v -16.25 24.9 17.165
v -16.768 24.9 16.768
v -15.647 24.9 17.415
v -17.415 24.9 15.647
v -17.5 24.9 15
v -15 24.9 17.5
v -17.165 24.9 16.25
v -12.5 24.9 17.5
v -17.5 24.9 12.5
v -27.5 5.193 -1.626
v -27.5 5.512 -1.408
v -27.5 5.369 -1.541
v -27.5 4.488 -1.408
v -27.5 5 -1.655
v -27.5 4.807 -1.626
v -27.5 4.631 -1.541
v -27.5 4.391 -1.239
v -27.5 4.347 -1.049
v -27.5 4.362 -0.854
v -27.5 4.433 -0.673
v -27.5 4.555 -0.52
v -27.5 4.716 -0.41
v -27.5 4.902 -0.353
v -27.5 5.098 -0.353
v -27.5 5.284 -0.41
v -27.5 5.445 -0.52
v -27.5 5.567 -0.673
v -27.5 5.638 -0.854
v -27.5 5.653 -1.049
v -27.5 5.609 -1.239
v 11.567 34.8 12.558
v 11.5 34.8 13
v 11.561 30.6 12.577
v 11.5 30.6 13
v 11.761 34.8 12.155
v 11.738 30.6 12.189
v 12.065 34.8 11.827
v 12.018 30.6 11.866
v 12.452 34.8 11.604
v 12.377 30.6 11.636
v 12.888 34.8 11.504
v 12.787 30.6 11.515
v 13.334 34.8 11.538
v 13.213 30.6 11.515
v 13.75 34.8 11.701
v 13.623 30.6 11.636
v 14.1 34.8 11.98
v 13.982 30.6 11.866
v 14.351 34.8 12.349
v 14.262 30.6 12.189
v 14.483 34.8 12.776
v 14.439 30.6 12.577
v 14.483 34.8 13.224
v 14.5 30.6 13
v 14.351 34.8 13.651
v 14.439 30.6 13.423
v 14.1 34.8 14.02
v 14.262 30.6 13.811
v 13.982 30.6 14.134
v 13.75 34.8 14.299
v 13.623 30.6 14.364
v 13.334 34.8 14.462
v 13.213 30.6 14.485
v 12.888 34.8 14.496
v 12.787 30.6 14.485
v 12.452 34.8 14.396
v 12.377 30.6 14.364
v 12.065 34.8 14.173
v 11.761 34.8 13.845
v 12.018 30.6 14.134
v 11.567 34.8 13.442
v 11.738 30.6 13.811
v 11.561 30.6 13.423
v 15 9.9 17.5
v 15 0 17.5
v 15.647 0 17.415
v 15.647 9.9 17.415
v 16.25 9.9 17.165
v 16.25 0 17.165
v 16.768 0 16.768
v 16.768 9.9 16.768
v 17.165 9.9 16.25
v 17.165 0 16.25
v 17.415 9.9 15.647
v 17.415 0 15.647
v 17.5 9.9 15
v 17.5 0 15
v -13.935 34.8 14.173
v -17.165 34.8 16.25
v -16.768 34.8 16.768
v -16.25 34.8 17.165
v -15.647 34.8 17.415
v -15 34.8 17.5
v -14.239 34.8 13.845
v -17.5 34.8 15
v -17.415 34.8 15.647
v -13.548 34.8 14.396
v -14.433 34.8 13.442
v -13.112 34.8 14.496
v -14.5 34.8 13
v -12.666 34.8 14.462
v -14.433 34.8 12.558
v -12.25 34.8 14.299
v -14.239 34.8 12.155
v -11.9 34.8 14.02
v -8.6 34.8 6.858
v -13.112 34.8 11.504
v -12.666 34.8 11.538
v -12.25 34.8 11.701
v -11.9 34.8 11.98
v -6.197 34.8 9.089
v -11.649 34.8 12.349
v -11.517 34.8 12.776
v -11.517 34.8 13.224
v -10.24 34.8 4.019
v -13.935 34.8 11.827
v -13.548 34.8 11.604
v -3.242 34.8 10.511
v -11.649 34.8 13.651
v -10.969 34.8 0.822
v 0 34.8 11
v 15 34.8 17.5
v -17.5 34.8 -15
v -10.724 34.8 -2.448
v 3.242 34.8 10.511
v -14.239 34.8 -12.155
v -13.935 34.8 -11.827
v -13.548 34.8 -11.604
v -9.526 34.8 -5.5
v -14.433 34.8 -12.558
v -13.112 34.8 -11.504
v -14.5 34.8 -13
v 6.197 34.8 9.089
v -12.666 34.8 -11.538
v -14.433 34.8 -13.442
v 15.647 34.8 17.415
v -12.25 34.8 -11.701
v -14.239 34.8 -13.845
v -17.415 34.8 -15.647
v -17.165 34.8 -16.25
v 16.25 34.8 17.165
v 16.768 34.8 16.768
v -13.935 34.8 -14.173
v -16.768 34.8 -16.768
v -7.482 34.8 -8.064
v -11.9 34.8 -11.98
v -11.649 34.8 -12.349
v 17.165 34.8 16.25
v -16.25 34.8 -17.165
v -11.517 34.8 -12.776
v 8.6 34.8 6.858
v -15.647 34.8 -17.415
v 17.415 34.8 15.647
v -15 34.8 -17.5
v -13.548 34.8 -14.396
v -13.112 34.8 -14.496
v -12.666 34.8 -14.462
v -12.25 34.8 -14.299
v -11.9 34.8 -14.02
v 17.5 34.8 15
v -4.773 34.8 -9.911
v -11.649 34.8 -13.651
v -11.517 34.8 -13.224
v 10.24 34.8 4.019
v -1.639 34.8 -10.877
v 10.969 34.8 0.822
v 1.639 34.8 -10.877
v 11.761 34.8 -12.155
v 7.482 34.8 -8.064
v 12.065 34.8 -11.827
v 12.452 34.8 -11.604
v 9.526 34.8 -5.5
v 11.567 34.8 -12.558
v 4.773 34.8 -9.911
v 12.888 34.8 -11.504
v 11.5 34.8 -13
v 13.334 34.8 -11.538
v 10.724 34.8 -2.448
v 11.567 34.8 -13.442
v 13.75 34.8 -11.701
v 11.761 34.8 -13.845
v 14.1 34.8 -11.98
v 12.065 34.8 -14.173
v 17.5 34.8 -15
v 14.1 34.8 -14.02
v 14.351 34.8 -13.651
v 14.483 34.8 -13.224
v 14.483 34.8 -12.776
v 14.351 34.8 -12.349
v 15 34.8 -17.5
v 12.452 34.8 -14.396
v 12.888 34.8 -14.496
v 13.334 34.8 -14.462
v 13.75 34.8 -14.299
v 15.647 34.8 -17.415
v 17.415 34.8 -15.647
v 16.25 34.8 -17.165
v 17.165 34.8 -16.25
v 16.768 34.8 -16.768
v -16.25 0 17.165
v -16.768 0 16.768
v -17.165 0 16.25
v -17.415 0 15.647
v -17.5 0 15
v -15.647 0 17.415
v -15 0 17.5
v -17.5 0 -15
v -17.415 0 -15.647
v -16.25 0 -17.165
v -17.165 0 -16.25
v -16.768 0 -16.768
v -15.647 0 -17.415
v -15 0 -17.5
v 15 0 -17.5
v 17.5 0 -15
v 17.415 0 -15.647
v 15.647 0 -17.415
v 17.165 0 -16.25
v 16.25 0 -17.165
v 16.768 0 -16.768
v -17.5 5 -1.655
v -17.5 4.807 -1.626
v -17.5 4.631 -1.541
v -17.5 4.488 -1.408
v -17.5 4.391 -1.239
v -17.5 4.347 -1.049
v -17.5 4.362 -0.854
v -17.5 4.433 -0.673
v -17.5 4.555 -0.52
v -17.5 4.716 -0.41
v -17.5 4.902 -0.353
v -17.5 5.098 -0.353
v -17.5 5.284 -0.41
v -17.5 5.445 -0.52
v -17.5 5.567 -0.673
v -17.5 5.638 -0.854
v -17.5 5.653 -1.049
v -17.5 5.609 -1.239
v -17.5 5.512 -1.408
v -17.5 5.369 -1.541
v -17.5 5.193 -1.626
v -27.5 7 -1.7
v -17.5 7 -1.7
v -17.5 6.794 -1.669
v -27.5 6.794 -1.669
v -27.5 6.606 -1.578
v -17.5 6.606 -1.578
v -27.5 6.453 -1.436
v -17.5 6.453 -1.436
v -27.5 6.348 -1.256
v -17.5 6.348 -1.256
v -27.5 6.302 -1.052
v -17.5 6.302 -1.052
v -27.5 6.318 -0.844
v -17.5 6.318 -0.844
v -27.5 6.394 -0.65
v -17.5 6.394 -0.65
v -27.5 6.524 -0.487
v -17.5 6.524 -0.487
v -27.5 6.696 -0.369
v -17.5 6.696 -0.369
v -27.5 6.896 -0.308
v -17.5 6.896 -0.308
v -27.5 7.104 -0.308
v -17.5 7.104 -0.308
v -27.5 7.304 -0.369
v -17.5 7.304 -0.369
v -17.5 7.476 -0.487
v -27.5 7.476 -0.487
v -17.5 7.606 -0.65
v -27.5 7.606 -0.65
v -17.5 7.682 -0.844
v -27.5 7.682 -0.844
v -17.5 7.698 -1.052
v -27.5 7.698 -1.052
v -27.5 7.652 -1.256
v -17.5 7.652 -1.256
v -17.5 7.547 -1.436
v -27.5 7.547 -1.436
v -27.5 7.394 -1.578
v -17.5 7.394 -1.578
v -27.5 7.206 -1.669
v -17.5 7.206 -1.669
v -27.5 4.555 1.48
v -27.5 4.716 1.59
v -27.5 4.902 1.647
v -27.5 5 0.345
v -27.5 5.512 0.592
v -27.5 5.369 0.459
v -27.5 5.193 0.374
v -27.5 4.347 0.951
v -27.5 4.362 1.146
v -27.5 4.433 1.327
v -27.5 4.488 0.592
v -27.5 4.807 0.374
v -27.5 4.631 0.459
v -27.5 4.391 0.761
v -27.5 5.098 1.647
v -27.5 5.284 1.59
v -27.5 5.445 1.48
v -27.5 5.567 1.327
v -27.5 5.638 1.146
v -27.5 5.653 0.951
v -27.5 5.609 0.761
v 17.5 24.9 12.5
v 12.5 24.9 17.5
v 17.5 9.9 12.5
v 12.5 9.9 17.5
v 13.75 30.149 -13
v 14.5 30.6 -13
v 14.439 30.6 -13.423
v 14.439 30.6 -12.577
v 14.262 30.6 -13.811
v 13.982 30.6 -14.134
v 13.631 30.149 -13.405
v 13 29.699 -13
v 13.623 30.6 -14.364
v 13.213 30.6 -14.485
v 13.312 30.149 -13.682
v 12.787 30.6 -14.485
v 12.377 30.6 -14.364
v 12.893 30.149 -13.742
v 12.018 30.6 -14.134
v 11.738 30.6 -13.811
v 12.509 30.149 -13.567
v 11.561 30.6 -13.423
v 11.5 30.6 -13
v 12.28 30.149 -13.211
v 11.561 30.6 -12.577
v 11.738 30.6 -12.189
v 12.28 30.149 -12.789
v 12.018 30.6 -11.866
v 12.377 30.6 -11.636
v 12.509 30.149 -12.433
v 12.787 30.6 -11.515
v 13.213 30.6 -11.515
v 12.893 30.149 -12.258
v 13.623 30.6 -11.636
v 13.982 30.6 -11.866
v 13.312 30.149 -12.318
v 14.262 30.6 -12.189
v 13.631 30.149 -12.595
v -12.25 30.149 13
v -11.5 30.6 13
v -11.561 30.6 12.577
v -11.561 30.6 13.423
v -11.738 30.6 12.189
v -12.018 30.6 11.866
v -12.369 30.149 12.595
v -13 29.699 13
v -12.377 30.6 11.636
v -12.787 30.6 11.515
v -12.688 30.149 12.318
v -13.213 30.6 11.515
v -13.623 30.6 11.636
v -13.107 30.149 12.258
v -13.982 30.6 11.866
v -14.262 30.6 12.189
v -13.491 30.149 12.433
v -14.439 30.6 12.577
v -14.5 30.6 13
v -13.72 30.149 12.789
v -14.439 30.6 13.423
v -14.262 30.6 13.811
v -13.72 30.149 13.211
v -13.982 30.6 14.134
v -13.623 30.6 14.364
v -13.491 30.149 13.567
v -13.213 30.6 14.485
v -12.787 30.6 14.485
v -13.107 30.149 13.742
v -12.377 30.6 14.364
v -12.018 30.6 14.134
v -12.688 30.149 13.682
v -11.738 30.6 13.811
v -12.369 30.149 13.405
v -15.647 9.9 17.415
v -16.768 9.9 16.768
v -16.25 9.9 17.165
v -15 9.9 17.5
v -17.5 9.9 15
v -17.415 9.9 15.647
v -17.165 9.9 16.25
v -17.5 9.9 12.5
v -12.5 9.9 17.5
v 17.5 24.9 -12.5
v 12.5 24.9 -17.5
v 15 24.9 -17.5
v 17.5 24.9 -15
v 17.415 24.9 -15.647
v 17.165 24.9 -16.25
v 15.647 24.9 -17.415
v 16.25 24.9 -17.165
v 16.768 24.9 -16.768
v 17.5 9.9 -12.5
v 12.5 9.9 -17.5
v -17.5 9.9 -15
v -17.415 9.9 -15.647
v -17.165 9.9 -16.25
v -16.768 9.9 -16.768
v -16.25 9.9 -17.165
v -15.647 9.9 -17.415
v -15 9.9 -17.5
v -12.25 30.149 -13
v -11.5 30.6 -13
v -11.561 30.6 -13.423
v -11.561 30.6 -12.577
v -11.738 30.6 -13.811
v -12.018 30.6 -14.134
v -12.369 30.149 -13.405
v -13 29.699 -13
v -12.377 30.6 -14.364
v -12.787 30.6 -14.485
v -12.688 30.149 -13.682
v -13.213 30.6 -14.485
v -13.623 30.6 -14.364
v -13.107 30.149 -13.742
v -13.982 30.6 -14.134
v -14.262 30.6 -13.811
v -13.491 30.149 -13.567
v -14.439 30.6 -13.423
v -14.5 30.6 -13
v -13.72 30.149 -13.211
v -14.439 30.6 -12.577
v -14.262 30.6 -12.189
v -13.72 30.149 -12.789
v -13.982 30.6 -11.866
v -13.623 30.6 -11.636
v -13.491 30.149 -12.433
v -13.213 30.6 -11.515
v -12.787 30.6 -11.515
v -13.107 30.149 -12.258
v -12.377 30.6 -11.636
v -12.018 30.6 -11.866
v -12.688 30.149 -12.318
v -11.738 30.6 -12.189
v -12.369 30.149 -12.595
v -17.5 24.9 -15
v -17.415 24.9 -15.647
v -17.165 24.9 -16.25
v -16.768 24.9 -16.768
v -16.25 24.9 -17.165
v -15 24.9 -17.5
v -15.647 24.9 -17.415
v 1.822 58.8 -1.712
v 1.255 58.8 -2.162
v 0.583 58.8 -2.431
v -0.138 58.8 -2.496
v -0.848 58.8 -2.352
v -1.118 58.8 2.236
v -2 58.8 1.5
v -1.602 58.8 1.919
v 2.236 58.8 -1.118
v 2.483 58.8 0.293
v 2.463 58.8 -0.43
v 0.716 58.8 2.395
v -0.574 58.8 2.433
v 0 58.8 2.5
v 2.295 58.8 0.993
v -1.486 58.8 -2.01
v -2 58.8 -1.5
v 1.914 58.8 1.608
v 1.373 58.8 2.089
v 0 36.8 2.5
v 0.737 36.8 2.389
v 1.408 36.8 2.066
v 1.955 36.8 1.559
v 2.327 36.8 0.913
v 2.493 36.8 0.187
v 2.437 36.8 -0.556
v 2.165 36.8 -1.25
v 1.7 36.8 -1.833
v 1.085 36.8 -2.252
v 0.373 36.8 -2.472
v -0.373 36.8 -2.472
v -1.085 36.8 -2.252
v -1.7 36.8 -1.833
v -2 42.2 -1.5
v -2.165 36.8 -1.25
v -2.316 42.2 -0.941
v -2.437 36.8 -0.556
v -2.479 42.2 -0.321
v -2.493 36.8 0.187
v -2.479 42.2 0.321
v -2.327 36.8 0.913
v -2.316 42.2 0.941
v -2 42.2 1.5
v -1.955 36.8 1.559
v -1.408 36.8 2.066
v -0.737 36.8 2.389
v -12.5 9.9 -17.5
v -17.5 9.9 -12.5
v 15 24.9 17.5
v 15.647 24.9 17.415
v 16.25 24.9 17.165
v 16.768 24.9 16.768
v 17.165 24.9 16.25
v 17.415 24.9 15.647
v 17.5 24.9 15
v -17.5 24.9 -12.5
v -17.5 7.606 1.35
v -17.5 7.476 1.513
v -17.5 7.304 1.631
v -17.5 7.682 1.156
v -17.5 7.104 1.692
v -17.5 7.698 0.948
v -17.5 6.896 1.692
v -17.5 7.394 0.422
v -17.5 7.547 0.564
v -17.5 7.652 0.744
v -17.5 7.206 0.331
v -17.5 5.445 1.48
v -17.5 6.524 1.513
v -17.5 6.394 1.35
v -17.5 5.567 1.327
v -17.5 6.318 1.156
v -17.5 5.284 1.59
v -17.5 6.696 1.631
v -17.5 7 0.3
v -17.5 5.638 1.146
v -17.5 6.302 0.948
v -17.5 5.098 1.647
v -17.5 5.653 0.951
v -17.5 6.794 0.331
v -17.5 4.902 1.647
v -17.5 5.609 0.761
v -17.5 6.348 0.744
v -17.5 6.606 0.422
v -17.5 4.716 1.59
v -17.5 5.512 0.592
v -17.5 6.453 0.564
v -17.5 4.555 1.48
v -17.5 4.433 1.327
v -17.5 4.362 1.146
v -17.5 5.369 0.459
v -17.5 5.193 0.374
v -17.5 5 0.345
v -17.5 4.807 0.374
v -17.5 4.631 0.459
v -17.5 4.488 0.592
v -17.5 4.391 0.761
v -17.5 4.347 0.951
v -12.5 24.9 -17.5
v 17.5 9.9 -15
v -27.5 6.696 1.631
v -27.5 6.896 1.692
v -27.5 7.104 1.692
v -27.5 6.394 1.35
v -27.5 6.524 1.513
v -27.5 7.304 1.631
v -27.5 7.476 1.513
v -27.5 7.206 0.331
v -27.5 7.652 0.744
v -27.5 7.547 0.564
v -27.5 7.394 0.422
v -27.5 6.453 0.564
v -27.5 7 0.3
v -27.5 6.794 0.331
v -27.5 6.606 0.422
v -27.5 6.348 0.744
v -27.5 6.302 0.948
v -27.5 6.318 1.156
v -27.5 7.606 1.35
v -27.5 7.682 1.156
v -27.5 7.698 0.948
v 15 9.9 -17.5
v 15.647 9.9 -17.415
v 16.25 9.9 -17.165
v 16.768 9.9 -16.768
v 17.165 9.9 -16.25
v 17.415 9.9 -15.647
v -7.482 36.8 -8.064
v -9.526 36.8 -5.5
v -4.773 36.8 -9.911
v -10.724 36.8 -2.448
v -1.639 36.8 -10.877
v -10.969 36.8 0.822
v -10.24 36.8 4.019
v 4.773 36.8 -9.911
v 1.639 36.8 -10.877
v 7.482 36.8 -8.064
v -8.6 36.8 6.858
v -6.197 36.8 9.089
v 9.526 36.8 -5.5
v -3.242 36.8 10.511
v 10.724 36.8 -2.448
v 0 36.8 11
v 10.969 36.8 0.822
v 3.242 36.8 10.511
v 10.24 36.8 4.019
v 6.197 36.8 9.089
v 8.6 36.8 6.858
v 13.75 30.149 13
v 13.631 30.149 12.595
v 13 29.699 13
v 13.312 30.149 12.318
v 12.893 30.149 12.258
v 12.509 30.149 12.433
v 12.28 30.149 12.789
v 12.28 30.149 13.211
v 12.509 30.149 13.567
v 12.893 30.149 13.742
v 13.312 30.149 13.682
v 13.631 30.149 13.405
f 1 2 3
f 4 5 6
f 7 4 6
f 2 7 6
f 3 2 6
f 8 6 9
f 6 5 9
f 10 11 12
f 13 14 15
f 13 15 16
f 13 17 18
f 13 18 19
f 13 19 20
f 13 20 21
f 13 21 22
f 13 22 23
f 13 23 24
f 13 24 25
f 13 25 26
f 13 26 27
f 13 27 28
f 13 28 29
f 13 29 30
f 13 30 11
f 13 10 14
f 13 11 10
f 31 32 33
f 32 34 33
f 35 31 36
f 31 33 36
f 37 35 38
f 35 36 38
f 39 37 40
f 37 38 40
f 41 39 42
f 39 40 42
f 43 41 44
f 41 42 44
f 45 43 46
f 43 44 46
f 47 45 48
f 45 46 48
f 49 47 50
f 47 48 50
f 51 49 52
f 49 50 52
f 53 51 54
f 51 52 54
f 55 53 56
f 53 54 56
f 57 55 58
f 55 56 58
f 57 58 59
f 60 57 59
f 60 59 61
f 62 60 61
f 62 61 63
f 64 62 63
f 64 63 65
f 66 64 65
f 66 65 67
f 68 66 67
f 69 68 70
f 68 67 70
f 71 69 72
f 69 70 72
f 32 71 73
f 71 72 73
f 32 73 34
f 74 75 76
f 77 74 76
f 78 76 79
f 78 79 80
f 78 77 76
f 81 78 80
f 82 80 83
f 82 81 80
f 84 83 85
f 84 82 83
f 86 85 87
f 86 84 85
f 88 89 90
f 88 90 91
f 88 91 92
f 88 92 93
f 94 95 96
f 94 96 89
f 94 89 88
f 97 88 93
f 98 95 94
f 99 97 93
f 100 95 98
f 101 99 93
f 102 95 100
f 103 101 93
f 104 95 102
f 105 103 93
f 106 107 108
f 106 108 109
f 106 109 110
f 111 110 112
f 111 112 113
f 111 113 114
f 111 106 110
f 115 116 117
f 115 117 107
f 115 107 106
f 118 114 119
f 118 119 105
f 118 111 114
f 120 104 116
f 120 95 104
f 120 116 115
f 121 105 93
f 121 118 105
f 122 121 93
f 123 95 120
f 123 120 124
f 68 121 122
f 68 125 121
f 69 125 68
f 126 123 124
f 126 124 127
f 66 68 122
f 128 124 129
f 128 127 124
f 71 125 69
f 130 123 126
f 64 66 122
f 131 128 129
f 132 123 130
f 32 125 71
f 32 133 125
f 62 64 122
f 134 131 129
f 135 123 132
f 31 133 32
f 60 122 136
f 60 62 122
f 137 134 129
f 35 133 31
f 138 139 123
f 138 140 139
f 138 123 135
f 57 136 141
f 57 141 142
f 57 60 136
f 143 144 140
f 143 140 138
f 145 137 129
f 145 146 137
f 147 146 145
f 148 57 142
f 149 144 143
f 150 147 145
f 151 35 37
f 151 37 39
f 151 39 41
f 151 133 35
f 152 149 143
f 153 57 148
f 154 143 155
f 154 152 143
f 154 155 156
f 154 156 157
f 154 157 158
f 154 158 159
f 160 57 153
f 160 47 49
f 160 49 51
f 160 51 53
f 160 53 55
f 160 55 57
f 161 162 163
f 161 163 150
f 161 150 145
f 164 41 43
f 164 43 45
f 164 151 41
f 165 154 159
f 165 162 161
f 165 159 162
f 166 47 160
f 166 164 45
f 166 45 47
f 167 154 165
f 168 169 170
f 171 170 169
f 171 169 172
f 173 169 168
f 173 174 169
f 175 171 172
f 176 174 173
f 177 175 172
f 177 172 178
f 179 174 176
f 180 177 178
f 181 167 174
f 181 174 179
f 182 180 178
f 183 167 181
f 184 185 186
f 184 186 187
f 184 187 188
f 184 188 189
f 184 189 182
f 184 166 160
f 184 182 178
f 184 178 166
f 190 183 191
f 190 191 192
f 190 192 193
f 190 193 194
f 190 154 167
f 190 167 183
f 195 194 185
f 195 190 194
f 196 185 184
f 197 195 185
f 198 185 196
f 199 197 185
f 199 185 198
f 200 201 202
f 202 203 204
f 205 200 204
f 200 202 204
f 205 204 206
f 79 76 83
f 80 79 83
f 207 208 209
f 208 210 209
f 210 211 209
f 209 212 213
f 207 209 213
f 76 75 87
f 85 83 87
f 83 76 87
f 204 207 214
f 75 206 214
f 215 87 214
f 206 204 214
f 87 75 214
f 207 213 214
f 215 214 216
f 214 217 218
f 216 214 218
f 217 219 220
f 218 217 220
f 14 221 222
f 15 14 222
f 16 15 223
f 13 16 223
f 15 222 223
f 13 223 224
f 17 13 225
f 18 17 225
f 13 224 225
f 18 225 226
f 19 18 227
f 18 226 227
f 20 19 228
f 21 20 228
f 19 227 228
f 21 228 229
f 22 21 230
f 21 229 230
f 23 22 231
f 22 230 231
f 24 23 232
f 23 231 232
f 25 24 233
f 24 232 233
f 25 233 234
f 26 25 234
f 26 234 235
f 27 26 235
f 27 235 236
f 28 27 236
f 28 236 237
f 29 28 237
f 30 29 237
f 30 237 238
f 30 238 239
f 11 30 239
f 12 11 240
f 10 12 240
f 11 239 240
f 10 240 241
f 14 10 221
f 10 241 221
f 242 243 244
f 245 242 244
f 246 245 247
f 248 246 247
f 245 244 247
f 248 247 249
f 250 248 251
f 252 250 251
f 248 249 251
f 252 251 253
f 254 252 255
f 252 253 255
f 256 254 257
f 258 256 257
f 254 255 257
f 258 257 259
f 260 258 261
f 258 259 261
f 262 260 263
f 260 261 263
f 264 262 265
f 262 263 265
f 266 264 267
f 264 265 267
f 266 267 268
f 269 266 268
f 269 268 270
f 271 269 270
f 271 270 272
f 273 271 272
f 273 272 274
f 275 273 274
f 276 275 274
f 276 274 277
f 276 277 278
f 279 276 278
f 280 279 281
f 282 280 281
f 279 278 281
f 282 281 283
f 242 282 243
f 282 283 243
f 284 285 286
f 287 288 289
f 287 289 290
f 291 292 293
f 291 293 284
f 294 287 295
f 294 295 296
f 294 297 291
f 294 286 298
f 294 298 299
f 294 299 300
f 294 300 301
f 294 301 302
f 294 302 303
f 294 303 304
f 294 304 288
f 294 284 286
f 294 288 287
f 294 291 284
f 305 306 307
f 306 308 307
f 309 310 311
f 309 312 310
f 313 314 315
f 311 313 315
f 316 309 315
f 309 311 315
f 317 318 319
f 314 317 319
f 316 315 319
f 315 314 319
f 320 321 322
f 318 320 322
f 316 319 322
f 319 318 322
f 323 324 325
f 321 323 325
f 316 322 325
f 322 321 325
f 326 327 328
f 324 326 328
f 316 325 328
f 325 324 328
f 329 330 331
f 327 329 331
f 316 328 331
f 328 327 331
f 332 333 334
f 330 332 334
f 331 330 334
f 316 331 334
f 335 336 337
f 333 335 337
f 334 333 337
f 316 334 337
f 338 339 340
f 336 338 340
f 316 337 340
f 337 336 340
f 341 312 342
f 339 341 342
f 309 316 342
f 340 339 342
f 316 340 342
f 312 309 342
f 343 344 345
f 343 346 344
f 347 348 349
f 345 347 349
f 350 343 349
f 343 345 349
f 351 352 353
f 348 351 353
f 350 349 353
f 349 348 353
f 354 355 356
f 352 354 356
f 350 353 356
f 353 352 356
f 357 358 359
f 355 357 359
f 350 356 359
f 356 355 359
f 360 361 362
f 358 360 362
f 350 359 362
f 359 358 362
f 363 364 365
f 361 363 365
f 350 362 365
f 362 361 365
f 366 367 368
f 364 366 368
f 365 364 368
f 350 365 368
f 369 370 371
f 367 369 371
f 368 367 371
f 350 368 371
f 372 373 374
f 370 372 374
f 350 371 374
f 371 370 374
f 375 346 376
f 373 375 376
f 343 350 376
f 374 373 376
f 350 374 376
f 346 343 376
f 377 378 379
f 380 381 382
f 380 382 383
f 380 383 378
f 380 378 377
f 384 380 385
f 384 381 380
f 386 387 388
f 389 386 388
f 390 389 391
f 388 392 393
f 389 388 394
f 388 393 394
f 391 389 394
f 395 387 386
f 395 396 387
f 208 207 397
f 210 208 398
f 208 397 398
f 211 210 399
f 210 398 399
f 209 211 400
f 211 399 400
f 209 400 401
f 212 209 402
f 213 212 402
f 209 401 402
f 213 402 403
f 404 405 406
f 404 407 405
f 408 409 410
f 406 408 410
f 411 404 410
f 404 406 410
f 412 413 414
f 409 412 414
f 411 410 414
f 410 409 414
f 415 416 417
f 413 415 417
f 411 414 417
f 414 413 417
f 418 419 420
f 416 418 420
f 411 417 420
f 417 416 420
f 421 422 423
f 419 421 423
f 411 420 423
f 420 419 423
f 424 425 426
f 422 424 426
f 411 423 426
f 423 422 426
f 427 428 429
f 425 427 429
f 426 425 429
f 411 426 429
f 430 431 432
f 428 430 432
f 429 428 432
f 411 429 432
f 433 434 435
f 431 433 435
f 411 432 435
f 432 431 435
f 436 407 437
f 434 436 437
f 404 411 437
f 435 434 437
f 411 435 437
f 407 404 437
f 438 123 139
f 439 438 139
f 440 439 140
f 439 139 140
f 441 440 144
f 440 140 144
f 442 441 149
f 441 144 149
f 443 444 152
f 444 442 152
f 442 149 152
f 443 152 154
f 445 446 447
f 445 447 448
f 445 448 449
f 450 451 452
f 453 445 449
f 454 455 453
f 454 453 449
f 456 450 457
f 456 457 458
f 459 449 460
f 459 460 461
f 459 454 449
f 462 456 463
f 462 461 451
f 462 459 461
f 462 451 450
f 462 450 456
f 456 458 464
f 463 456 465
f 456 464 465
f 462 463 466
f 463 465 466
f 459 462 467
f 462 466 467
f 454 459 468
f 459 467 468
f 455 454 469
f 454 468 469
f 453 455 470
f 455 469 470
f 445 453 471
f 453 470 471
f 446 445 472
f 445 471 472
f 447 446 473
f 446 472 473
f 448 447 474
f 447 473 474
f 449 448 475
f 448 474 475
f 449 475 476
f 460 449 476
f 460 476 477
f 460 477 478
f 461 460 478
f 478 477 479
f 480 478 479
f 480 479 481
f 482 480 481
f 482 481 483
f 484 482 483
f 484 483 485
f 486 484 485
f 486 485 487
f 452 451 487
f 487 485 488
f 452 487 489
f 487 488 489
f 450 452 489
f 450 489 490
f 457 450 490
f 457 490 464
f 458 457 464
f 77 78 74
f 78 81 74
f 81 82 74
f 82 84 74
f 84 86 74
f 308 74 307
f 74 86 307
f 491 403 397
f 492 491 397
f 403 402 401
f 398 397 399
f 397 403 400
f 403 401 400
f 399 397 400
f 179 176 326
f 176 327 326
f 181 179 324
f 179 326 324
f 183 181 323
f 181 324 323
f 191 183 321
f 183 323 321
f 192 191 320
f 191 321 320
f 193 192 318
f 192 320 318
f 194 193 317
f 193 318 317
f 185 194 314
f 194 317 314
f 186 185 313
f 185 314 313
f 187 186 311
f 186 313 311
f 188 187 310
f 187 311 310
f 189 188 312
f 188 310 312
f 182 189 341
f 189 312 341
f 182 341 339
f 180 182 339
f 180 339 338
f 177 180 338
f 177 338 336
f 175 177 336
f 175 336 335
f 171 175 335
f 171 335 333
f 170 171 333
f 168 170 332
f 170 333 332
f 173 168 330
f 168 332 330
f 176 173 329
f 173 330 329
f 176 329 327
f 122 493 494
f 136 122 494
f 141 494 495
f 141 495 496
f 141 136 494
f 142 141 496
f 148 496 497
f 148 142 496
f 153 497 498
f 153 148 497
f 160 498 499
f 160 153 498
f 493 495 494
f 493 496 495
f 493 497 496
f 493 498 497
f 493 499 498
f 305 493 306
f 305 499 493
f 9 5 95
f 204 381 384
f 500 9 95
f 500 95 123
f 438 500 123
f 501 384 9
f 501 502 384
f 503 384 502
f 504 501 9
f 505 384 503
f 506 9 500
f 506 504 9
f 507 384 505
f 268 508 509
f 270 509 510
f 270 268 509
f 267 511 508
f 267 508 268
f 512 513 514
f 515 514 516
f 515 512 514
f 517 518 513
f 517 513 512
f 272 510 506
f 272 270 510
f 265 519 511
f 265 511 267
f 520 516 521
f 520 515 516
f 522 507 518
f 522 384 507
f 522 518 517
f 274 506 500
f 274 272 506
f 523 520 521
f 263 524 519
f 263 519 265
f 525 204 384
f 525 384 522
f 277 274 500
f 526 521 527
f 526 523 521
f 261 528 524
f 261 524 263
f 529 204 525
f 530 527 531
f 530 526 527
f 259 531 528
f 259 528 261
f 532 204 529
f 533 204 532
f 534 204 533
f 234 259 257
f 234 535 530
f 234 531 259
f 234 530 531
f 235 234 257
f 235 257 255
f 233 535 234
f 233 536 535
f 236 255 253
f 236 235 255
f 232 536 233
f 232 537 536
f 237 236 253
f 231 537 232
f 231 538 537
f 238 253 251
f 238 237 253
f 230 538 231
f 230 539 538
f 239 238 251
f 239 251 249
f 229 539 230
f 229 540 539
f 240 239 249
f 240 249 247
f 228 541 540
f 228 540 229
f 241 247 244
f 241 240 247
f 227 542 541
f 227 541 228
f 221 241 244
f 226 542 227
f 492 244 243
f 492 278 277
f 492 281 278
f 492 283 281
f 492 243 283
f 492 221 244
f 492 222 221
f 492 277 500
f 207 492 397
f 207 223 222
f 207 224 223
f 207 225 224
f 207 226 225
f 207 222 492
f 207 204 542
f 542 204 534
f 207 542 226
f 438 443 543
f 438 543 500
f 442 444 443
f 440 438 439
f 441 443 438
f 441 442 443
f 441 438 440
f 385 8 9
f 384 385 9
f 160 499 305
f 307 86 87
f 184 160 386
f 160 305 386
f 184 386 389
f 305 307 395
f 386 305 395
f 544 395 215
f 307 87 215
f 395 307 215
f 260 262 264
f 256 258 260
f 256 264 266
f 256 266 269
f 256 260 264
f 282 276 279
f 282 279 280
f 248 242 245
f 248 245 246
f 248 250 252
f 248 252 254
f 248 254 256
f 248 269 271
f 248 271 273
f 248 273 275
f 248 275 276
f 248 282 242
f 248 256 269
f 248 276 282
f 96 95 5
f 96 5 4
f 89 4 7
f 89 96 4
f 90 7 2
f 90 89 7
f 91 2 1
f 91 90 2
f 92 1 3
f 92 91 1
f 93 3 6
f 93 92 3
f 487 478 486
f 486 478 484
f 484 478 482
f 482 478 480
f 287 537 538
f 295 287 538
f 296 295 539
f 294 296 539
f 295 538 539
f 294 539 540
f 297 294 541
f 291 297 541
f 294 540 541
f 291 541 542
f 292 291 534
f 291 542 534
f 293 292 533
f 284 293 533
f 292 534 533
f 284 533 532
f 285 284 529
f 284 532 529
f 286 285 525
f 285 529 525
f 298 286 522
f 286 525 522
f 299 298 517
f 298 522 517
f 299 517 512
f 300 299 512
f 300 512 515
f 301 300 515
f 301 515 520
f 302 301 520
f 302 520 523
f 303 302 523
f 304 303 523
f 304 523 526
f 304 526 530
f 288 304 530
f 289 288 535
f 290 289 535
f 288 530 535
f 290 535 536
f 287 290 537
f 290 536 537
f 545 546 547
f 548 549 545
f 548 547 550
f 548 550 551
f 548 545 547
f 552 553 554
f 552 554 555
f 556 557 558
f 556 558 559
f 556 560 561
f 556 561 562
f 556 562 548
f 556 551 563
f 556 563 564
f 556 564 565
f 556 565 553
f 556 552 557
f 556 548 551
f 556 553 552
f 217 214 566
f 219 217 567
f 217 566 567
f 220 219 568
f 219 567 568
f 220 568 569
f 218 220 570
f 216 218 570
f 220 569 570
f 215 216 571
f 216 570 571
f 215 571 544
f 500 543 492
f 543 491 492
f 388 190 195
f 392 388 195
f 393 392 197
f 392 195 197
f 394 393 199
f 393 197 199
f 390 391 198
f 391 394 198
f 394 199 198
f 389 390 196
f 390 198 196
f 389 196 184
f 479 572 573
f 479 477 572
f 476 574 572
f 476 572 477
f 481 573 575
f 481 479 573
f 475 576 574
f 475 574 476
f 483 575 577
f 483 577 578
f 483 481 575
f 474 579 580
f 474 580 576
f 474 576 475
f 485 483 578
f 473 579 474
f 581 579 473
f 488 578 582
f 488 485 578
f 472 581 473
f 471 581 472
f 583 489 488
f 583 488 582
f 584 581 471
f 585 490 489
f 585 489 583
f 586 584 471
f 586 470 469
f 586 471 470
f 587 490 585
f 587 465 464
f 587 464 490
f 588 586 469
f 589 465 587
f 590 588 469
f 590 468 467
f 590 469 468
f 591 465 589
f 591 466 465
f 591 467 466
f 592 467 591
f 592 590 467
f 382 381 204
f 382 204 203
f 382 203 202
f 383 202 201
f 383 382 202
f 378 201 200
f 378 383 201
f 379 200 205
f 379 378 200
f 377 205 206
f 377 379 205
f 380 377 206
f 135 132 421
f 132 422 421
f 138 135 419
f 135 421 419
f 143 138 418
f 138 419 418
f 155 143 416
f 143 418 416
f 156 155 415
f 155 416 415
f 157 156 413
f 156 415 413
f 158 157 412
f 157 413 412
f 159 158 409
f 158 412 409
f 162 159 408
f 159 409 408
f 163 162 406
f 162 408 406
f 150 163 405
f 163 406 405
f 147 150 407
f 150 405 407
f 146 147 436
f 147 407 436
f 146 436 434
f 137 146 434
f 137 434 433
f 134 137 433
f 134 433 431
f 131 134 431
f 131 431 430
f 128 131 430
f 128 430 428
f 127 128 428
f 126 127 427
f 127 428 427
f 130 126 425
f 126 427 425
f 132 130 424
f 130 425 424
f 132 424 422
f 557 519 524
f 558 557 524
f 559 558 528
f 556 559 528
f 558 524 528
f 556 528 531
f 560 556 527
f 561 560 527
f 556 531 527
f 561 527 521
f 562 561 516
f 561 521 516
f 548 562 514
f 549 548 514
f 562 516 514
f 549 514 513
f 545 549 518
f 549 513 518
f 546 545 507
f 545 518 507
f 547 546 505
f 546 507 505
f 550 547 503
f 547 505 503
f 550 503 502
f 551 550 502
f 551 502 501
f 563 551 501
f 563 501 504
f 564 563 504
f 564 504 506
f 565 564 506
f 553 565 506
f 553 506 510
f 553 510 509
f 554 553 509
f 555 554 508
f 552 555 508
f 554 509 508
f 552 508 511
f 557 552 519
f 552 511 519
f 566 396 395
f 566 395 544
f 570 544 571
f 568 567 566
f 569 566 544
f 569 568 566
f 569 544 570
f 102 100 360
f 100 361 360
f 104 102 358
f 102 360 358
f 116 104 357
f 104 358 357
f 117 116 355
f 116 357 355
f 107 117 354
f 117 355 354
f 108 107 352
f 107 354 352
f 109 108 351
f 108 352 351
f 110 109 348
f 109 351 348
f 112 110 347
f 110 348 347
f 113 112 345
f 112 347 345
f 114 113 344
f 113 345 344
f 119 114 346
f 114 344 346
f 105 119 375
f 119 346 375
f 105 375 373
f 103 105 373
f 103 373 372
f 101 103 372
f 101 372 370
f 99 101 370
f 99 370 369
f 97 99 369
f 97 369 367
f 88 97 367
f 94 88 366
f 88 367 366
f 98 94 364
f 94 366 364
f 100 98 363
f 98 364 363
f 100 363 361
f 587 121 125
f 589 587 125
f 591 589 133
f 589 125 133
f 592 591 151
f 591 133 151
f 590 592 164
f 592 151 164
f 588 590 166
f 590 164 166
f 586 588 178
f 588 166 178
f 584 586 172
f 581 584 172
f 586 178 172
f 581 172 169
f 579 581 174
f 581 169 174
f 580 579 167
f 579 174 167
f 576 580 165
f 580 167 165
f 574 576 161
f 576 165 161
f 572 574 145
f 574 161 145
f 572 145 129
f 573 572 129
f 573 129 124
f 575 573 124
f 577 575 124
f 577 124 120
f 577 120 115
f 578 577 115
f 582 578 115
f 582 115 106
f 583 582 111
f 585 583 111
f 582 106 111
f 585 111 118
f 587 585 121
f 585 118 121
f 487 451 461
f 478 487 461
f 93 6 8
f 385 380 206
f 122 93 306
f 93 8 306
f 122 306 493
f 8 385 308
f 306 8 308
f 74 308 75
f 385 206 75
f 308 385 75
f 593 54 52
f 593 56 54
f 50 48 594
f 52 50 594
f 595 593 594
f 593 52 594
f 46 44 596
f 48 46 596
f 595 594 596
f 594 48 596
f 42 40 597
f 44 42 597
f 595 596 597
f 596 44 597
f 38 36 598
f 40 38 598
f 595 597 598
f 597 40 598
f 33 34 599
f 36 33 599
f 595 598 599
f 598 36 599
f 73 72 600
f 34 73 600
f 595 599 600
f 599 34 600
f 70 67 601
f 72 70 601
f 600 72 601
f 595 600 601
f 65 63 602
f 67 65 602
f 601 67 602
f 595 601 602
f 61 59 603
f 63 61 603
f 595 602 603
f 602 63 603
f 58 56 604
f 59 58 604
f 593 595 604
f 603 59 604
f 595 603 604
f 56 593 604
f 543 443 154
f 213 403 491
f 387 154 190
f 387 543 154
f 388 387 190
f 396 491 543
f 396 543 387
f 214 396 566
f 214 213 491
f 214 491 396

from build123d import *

# Parameters (mm, degrees)
ESQUISSE1_W                       = 35
ESQUISSE1_H                       = 35
BOSS_EXTRU_1_DEPTH                = 34.8
ESQUISSE2_R                       = 11
BOSS_EXTRU_2_DEPTH                = 2
ESQUISSE3_R                       = 2.5
BOSS_EXTRU_3_DEPTH                = 22
ESQUISSE8_W                       = 1.389274908
ESQUISSE8_H                       = 3
ENL_V_MAT_EXTRU_2_DEPTH           = 16.6
DIAM_TRE_DU_PER_AGE_3_0_3_1_D     = 3
DIAM_TRE_DU_PER_AGE_3_0_3_1_DEPTH = 4.2
DIAM_TRE_DU_PER_AGE_3_0_3_1_TIP   = 0.901290929
CONG_1_R                          = 2.5
ENL_V_MAT_EXTRU_1_DEPTH           = 7.5
ESQUISSE5_R                       = 0.7
ESQUISSE5_R_2                     = 0.654723083
BOSS_EXTRU_4_DEPTH                = 10


with BuildPart() as part:
    # Esquisse1 → Boss.-Extru.1 (new body)
    with BuildSketch(Plane(origin=(0, 0, 0), x_dir=(1, 0, 0), z_dir=(0, 1, 0))):
        Rectangle(ESQUISSE1_W, ESQUISSE1_H)
    extrude(amount=BOSS_EXTRU_1_DEPTH)

    # Esquisse2 → Boss.-Extru.2 (add)
    with BuildSketch(Plane(origin=(0, 34.8, 0), x_dir=(1, 0, 0), z_dir=(0, 1, 0))):
        with Locations(Location((0, 0, 0), (0, 0, 270))):
            Circle(ESQUISSE2_R)
    extrude(amount=BOSS_EXTRU_2_DEPTH)

    # Esquisse3 → Boss.-Extru.3 (add)
    with BuildSketch(Plane(origin=(0, 36.8, 0), x_dir=(1, 0, 0), z_dir=(0, 1, 0))):
        with Locations(Location((0, 0, 0), (0, 0, 270))):
            Circle(ESQUISSE3_R)
    extrude(amount=BOSS_EXTRU_3_DEPTH)

    # Esquisse8 → Enlèv. mat.-Extru.2 (cut)
    with BuildSketch(Plane(origin=(0, 58.8, 0), x_dir=(1, 0, 0), z_dir=(0, 1, 0))):
        with Locations((-2.694637454, 0)):
            Rectangle(ESQUISSE8_W, ESQUISSE8_H)
    extrude(amount=-ENL_V_MAT_EXTRU_2_DEPTH, mode=Mode.SUBTRACT)

    # Diamètre du perçage Ø3.0 (3)1
    with Locations(Plane(origin=(0, 34.8, 0), x_dir=(1, 0, 0), z_dir=(0, 1, 0))):
        with Locations((-13, 13), (13, 13), (13, -13), (-13, -13)):
            Hole(DIAM_TRE_DU_PER_AGE_3_0_3_1_D / 2, depth=DIAM_TRE_DU_PER_AGE_3_0_3_1_DEPTH)
            with Locations((0, 0, -(DIAM_TRE_DU_PER_AGE_3_0_3_1_DEPTH + DIAM_TRE_DU_PER_AGE_3_0_3_1_TIP / 2))):  # 118° drill point
                Cone(0, DIAM_TRE_DU_PER_AGE_3_0_3_1_D / 2, DIAM_TRE_DU_PER_AGE_3_0_3_1_TIP, mode=Mode.SUBTRACT)

    # Congé1
    cong_1_edges = [part.edges().sort_by_distance(p)[0] for p in [
        (-17.5, 17.4, -17.5),
        (17.5, 17.4, -17.5),
        (17.5, 17.4, 17.5),
        (-17.5, 17.4, 17.5),
    ]]
    fillet(cong_1_edges, radius=CONG_1_R)

    # Esquisse4 → Enlèv. mat.-Extru.1 (cut, symmetric)
    with BuildSketch(Plane(origin=(0, 17.4, 0), x_dir=(1, 0, 0), z_dir=(0, 1, 0))):
        Polygon((-12.5, 17.5), (-17.5, 12.5), (-17.5, 17.5), align=None)
        Polygon((17.5, 17.5), (12.5, 17.5), (17.5, 12.5), align=None)
        Polygon((12.5, -17.5), (17.5, -12.5), (17.5, -17.5), align=None)
        Polygon((-17.5, -17.5), (-12.5, -17.5), (-17.5, -12.5), align=None)
    extrude(amount=ENL_V_MAT_EXTRU_1_DEPTH, both=True, mode=Mode.SUBTRACT)

    # Esquisse5 → Boss.-Extru.4 (add)
    with BuildSketch(Plane.ZY.offset(17.5)):
        with Locations(Location((-1, 7, 0), (0, 0, 180))):
            Circle(ESQUISSE5_R)
        with Locations(Location((-1, 5, 0), (0, 0, 180))):
            Circle(ESQUISSE5_R_2)
        with Locations(Location((1, 5, 0), (0, 0, 180))):
            Circle(ESQUISSE5_R_2)
        with Locations(Location((1, 7, 0), (0, 0, 180))):
            Circle(ESQUISSE5_R)
    extrude(amount=BOSS_EXTRU_4_DEPTH)


solid = part.part
